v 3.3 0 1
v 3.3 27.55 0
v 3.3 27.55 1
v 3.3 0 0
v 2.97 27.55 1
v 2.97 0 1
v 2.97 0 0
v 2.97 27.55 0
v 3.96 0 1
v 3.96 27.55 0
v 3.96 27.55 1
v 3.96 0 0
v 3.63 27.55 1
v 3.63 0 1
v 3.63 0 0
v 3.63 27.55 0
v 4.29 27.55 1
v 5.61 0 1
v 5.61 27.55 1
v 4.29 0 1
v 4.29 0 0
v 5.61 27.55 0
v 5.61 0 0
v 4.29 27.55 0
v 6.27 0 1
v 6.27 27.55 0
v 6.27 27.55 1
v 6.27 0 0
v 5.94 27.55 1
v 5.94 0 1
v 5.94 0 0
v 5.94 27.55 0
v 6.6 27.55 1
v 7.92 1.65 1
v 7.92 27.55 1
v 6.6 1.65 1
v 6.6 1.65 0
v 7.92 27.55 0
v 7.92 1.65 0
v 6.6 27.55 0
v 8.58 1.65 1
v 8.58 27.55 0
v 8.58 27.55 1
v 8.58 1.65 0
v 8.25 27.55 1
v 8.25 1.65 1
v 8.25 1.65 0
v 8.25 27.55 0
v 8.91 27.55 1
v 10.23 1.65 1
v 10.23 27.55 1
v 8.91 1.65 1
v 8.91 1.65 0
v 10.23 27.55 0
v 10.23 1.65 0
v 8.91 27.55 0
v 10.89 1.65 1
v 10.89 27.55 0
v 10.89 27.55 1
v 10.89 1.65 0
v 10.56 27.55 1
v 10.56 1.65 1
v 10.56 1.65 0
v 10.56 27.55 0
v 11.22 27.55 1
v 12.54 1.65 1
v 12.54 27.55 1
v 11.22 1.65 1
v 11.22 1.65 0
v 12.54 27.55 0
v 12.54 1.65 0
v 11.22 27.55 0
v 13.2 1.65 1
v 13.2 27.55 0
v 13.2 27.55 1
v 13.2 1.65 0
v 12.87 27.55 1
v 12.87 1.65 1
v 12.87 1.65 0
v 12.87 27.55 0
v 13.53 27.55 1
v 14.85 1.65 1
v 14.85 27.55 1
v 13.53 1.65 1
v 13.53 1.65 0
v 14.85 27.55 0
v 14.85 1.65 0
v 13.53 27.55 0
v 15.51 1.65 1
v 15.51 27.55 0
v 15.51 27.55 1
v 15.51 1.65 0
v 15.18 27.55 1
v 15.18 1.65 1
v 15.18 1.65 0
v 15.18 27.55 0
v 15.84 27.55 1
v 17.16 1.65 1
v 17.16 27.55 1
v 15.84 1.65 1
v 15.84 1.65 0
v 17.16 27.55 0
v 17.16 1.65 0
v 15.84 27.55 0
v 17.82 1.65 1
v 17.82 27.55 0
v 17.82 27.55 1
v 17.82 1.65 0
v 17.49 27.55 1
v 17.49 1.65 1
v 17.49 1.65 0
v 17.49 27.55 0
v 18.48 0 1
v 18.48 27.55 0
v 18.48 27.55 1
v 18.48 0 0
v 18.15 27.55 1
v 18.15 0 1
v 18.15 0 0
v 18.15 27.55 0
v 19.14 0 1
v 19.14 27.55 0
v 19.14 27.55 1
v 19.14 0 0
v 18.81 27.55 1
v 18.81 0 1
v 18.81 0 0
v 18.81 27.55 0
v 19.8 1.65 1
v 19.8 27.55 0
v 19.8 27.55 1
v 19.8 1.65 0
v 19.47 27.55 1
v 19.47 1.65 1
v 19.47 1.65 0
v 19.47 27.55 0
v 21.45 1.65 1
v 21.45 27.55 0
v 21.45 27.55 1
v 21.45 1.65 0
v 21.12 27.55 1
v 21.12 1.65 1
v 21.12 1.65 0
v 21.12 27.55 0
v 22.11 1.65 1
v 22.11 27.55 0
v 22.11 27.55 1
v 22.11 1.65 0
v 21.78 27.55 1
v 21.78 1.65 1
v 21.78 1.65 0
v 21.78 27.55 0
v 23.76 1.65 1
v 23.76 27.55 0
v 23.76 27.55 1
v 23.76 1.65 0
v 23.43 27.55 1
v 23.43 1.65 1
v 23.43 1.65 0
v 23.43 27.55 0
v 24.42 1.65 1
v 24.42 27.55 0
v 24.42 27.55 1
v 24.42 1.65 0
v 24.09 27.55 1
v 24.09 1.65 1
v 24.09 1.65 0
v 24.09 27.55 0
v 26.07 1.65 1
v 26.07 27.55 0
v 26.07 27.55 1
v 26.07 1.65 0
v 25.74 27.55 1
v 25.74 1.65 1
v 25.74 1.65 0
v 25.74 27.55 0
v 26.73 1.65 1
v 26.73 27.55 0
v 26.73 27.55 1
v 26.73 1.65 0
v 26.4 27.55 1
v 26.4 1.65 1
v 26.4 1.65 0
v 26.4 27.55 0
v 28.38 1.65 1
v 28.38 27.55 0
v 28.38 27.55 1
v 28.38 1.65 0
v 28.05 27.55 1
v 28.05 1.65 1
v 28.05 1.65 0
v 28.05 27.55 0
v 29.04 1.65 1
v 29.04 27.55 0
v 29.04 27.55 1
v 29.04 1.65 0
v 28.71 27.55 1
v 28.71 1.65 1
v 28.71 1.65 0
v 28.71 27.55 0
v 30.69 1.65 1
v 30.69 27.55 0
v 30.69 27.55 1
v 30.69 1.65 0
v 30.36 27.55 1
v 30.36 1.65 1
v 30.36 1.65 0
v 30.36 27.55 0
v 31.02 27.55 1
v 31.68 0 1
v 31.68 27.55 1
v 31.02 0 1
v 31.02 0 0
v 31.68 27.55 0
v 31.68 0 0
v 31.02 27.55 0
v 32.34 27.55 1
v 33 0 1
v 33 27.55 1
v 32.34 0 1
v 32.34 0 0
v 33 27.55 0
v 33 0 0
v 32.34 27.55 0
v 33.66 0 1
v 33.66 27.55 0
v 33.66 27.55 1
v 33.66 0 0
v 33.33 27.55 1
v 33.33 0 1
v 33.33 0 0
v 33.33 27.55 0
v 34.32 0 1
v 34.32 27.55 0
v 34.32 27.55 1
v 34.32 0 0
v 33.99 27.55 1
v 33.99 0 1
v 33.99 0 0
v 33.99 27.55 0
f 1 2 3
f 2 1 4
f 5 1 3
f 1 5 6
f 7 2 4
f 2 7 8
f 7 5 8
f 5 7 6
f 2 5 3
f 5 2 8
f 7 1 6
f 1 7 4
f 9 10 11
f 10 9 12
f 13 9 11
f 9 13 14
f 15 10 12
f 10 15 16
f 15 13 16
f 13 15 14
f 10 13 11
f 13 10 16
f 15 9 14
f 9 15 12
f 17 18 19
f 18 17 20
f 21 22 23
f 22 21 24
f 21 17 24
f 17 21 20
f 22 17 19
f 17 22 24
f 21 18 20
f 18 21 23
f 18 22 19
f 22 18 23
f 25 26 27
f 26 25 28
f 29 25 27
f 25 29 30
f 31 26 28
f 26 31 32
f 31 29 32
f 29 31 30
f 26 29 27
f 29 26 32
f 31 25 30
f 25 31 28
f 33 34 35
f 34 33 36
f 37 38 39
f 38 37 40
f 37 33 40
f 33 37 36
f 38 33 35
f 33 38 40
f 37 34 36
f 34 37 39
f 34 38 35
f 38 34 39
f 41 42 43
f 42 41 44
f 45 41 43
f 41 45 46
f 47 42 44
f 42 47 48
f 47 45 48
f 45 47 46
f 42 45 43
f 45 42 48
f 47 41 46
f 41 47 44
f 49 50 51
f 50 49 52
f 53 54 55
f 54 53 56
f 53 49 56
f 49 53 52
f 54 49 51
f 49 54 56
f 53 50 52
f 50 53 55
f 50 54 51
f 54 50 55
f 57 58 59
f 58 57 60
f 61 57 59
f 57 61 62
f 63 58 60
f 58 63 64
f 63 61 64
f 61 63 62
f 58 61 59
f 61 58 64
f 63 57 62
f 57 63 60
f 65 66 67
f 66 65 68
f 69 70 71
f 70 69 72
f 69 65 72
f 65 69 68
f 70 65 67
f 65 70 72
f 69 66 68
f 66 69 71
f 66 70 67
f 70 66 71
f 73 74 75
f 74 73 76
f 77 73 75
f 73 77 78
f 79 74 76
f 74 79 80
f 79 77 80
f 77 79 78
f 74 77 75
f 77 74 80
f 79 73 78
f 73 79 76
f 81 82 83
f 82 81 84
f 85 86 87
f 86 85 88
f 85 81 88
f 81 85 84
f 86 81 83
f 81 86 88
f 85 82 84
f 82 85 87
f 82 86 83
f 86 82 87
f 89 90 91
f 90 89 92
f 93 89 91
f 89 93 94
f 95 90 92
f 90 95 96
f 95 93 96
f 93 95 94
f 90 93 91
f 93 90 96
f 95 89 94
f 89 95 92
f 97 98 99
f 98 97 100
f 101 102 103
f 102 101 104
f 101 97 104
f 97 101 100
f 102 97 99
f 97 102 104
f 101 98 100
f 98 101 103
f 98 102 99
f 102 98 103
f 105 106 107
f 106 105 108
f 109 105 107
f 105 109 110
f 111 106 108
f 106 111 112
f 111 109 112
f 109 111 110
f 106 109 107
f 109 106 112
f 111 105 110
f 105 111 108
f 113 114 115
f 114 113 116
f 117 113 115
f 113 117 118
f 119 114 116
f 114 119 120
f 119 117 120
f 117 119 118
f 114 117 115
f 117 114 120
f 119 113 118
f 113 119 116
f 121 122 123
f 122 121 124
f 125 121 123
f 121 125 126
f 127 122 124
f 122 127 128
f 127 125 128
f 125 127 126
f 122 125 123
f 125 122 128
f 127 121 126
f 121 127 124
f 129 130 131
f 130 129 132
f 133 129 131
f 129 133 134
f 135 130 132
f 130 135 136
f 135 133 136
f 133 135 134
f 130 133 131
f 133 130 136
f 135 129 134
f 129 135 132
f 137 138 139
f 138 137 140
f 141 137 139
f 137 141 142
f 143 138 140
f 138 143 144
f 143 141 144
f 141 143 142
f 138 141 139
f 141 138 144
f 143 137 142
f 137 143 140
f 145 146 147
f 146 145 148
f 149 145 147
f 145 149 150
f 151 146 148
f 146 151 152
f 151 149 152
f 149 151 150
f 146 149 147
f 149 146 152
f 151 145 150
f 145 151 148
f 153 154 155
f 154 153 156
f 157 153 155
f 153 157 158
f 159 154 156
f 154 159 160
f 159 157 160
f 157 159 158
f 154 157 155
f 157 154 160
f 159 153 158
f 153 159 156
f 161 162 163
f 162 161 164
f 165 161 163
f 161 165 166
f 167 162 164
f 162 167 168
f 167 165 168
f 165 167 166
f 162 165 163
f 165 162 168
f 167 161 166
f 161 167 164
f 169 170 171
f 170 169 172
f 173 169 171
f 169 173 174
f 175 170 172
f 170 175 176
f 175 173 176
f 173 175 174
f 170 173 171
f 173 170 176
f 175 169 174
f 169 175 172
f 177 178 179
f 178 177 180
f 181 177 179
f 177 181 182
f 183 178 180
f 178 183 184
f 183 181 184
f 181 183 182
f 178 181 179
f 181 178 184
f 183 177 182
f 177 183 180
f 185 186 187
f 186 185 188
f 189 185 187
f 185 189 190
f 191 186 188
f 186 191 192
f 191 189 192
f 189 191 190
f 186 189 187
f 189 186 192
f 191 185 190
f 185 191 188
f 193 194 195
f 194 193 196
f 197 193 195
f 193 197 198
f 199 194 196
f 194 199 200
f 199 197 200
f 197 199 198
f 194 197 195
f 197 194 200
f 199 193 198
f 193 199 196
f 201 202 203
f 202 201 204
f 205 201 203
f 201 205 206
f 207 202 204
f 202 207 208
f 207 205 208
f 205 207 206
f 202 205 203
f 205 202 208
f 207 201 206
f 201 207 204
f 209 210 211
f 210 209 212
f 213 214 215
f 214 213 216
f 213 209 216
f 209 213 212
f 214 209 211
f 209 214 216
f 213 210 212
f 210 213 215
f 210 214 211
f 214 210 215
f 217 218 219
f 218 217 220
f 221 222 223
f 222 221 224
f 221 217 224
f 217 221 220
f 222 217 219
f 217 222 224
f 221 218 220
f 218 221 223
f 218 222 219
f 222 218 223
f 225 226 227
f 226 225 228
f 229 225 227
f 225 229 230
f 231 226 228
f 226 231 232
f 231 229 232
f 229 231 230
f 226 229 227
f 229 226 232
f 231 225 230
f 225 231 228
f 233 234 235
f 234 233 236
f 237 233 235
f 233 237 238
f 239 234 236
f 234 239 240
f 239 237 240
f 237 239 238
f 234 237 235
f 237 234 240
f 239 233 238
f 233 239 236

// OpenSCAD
// file: ../../util/bitmap.scad
/*****************************************************************************
 * Module Bitmap Library
 * Modules to create bitmaps of unit squares from 1 or 2 dimensional vectors.
 *****************************************************************************
 * Copyright 2017 Chris Baker
 *
 * This program is free software: you can redistribute it and/or modify
 * it under the terms of the GNU Lesser General Public License as published by
 * the Free Software Foundation, either version 3 of the License, or
 * (at your option) any later version.
 *
 * This program is distributed in the hope that it will be useful,
 * but WITHOUT ANY WARRANTY; without even the implied warranty of
 * MERCHANTABILITY or FITNESS FOR A PARTICULAR PURPOSE.  See the
 * GNU Lesser General Public License for more details.
 *
 * You should have received a copy of the GNU Lesser General Public License
 * along with this program.  If not, see <http://www.gnu.org/licenses/>.
 *****************************************************************************
 * Usage:
 * Include this file with the "use" tag.
 * Depends on compat.scad library.
 *
 * API:
 *   1dbitmap(bitmap, center, expansion, vector_mode)
 *   2dbitmap(bitmap, center, expansion, vector_mode)
 *     Generate a 1 or 2-Dimensional field of modules based on the provided
 *     bitmap vector. See Bitmap Vectors below.
 *     The center flag determines whether to center the bitmap on the origin.
 *     The expansion value actually shrinks each cube in the x and y
 *     dimension by the specified amount.
 *     The vector_mode flag determines whether to create 3D solid geometry
 *     (unit cubes) or 2D vector geometry (squares).
 *
 * Bitmap Vectors:
 *   The bitmap vectors primarily provide boolean information.
 *   A module will be placed where these vectors have a postive value and
 *   skipped where they have a negative value. I.E. 0, -1, false, and undef
 *   are all equivalent and result in a skip. 1 and true are equivalent and
 *   result in a placed 1-unit module.
 *   Further, if the value is an integer it will be treated as a height for
 *   the module, allowing z-maps to be created.
 *   If the value is not an integer or boolean, it will be treated as a color
 *   reference. This can be a string or RGBA vector that will be used to
 *   color the module in the OpenSCAD preview window.
 *   In current versions of OpenSCAD, the color has no effect in the rendered
 *   view or STL output.
 *
 * Vector Mode:
 *   Although OpenSCAD supports generating 2D geometry, there are several
 *   caveats:
 *   - 2D and 3D geometry cannot be mixed
 *   - Extruding 2D geometry causes color information to be lost
 *   - All 2D geometry is projected onto the XY plane when rendering
 *   - Rendering also results in loss of color (same as 3D)
 *   - The SVG exporter is somewhat limited:
 *     - The pixel size of the image is hard-coded in the file
 *     - The title of the image is a generic string
 *     - The color selection for stroke and fill is fixed
 *     - The stroke-width is set to a large value that will cause overlap
 *     - The background is transparent
 *     - Only one path element is created with all of the geometry; there is
 *       no easy way to split up the geometry into multiple logical units.
 *     - These issues can mostly be resolved by hand-editing the file:
 *       - Remove or modify the width and height parameters from the svg
 *         element at the top of the file to provide better scaling.
 *       - Edit the title element at the top of the file to change the title.
 *       - Edit the stroke and fill parameters of the path element (these will
 *         probably be at the end of the file).
 *       - Set the stroke-width parameter for the path element to 0.
 *****************************************************************************/
use <compat.scad>

/*
 * 2dbitmap - Turn a 2D vector into a bitmap of cubes
 *
 * bitmap - 2D vector representing where to place each cube
 *          Value can either be boolean, z-height, or color
 * center - center cubes around the origin
 * expansion - size of gap around each pixel (screendoor)
 * vector_mode - create a 2D vector drawing instead of 3D extrusion
 */
module 2dbitmap(bitmap=[[1,0],[0,1]], center=false, expansion=0, vector_mode=false)
{
	ylen=len(bitmap)-1;

	for (y=[0:ylen]) {
		xlen=len(bitmap[y])-1;
		for (x=[0:xlen])
			translate([x-(center?xlen/2:0),ylen-y-(center?ylen/2:0),0])
				if (is_indexable(bitmap[y][x]))
					color(bitmap[y][x])
						if (vector_mode)
							square([1-expansion,1-expansion], center=center);
						else
							cube([1-expansion,1-expansion,1], center=center);
				else
					if (bitmap[y][x])
						if (vector_mode)
							square([1-expansion,1-expansion], center=center);
						else
							cube([1-expansion,1-expansion,clamp_nonnum(bitmap[y][x])], center=center);
	}
}

module 1dbitmap(bitmap=[1,0,1,0,1], center=false, expansion=0, vector_mode=false)
	2dbitmap([bitmap], center, expansion, vector_mode);

/*
 * Examples
 */

// 1D with z-height
translate([10,0,0]) scale([1,10,1])
	1dbitmap(bitmap=[1,1,0,2,0,0,3], expansion=.1);

// 1D with boolean
translate([-20,0,0]) scale([1,10,1])
	1dbitmap(bitmap=[true,false,true,false,true,true]);

// 2D with z-height
scale([2,2,1])
	2dbitmap(bitmap=[[1,0,2,1],[0,3,3,0],[1,1,0,1]],
		center=true);

// 1D with color
translate([0,-10,0]) scale([1,3,1])
	1dbitmap(bitmap=["red","white","blue",[0,0.3,0,0.5]]);

// 1D with color using 2D-vector-mode
translate([-7,-8,0]) scale([1,2])
	1dbitmap(bitmap=["red",0,"blue",0,"green"], vector_mode=true);
translate([-4.5,-10,0]) scale([1,2])
	1dbitmap(bitmap=["red",0,"blue",0,"green"], vector_mode=true, center=true);
// main file
/* Unit Test 02: 3s No Text */
use <../upc.scad>
UPC_A("333333333331", bar="black", font=undef);
